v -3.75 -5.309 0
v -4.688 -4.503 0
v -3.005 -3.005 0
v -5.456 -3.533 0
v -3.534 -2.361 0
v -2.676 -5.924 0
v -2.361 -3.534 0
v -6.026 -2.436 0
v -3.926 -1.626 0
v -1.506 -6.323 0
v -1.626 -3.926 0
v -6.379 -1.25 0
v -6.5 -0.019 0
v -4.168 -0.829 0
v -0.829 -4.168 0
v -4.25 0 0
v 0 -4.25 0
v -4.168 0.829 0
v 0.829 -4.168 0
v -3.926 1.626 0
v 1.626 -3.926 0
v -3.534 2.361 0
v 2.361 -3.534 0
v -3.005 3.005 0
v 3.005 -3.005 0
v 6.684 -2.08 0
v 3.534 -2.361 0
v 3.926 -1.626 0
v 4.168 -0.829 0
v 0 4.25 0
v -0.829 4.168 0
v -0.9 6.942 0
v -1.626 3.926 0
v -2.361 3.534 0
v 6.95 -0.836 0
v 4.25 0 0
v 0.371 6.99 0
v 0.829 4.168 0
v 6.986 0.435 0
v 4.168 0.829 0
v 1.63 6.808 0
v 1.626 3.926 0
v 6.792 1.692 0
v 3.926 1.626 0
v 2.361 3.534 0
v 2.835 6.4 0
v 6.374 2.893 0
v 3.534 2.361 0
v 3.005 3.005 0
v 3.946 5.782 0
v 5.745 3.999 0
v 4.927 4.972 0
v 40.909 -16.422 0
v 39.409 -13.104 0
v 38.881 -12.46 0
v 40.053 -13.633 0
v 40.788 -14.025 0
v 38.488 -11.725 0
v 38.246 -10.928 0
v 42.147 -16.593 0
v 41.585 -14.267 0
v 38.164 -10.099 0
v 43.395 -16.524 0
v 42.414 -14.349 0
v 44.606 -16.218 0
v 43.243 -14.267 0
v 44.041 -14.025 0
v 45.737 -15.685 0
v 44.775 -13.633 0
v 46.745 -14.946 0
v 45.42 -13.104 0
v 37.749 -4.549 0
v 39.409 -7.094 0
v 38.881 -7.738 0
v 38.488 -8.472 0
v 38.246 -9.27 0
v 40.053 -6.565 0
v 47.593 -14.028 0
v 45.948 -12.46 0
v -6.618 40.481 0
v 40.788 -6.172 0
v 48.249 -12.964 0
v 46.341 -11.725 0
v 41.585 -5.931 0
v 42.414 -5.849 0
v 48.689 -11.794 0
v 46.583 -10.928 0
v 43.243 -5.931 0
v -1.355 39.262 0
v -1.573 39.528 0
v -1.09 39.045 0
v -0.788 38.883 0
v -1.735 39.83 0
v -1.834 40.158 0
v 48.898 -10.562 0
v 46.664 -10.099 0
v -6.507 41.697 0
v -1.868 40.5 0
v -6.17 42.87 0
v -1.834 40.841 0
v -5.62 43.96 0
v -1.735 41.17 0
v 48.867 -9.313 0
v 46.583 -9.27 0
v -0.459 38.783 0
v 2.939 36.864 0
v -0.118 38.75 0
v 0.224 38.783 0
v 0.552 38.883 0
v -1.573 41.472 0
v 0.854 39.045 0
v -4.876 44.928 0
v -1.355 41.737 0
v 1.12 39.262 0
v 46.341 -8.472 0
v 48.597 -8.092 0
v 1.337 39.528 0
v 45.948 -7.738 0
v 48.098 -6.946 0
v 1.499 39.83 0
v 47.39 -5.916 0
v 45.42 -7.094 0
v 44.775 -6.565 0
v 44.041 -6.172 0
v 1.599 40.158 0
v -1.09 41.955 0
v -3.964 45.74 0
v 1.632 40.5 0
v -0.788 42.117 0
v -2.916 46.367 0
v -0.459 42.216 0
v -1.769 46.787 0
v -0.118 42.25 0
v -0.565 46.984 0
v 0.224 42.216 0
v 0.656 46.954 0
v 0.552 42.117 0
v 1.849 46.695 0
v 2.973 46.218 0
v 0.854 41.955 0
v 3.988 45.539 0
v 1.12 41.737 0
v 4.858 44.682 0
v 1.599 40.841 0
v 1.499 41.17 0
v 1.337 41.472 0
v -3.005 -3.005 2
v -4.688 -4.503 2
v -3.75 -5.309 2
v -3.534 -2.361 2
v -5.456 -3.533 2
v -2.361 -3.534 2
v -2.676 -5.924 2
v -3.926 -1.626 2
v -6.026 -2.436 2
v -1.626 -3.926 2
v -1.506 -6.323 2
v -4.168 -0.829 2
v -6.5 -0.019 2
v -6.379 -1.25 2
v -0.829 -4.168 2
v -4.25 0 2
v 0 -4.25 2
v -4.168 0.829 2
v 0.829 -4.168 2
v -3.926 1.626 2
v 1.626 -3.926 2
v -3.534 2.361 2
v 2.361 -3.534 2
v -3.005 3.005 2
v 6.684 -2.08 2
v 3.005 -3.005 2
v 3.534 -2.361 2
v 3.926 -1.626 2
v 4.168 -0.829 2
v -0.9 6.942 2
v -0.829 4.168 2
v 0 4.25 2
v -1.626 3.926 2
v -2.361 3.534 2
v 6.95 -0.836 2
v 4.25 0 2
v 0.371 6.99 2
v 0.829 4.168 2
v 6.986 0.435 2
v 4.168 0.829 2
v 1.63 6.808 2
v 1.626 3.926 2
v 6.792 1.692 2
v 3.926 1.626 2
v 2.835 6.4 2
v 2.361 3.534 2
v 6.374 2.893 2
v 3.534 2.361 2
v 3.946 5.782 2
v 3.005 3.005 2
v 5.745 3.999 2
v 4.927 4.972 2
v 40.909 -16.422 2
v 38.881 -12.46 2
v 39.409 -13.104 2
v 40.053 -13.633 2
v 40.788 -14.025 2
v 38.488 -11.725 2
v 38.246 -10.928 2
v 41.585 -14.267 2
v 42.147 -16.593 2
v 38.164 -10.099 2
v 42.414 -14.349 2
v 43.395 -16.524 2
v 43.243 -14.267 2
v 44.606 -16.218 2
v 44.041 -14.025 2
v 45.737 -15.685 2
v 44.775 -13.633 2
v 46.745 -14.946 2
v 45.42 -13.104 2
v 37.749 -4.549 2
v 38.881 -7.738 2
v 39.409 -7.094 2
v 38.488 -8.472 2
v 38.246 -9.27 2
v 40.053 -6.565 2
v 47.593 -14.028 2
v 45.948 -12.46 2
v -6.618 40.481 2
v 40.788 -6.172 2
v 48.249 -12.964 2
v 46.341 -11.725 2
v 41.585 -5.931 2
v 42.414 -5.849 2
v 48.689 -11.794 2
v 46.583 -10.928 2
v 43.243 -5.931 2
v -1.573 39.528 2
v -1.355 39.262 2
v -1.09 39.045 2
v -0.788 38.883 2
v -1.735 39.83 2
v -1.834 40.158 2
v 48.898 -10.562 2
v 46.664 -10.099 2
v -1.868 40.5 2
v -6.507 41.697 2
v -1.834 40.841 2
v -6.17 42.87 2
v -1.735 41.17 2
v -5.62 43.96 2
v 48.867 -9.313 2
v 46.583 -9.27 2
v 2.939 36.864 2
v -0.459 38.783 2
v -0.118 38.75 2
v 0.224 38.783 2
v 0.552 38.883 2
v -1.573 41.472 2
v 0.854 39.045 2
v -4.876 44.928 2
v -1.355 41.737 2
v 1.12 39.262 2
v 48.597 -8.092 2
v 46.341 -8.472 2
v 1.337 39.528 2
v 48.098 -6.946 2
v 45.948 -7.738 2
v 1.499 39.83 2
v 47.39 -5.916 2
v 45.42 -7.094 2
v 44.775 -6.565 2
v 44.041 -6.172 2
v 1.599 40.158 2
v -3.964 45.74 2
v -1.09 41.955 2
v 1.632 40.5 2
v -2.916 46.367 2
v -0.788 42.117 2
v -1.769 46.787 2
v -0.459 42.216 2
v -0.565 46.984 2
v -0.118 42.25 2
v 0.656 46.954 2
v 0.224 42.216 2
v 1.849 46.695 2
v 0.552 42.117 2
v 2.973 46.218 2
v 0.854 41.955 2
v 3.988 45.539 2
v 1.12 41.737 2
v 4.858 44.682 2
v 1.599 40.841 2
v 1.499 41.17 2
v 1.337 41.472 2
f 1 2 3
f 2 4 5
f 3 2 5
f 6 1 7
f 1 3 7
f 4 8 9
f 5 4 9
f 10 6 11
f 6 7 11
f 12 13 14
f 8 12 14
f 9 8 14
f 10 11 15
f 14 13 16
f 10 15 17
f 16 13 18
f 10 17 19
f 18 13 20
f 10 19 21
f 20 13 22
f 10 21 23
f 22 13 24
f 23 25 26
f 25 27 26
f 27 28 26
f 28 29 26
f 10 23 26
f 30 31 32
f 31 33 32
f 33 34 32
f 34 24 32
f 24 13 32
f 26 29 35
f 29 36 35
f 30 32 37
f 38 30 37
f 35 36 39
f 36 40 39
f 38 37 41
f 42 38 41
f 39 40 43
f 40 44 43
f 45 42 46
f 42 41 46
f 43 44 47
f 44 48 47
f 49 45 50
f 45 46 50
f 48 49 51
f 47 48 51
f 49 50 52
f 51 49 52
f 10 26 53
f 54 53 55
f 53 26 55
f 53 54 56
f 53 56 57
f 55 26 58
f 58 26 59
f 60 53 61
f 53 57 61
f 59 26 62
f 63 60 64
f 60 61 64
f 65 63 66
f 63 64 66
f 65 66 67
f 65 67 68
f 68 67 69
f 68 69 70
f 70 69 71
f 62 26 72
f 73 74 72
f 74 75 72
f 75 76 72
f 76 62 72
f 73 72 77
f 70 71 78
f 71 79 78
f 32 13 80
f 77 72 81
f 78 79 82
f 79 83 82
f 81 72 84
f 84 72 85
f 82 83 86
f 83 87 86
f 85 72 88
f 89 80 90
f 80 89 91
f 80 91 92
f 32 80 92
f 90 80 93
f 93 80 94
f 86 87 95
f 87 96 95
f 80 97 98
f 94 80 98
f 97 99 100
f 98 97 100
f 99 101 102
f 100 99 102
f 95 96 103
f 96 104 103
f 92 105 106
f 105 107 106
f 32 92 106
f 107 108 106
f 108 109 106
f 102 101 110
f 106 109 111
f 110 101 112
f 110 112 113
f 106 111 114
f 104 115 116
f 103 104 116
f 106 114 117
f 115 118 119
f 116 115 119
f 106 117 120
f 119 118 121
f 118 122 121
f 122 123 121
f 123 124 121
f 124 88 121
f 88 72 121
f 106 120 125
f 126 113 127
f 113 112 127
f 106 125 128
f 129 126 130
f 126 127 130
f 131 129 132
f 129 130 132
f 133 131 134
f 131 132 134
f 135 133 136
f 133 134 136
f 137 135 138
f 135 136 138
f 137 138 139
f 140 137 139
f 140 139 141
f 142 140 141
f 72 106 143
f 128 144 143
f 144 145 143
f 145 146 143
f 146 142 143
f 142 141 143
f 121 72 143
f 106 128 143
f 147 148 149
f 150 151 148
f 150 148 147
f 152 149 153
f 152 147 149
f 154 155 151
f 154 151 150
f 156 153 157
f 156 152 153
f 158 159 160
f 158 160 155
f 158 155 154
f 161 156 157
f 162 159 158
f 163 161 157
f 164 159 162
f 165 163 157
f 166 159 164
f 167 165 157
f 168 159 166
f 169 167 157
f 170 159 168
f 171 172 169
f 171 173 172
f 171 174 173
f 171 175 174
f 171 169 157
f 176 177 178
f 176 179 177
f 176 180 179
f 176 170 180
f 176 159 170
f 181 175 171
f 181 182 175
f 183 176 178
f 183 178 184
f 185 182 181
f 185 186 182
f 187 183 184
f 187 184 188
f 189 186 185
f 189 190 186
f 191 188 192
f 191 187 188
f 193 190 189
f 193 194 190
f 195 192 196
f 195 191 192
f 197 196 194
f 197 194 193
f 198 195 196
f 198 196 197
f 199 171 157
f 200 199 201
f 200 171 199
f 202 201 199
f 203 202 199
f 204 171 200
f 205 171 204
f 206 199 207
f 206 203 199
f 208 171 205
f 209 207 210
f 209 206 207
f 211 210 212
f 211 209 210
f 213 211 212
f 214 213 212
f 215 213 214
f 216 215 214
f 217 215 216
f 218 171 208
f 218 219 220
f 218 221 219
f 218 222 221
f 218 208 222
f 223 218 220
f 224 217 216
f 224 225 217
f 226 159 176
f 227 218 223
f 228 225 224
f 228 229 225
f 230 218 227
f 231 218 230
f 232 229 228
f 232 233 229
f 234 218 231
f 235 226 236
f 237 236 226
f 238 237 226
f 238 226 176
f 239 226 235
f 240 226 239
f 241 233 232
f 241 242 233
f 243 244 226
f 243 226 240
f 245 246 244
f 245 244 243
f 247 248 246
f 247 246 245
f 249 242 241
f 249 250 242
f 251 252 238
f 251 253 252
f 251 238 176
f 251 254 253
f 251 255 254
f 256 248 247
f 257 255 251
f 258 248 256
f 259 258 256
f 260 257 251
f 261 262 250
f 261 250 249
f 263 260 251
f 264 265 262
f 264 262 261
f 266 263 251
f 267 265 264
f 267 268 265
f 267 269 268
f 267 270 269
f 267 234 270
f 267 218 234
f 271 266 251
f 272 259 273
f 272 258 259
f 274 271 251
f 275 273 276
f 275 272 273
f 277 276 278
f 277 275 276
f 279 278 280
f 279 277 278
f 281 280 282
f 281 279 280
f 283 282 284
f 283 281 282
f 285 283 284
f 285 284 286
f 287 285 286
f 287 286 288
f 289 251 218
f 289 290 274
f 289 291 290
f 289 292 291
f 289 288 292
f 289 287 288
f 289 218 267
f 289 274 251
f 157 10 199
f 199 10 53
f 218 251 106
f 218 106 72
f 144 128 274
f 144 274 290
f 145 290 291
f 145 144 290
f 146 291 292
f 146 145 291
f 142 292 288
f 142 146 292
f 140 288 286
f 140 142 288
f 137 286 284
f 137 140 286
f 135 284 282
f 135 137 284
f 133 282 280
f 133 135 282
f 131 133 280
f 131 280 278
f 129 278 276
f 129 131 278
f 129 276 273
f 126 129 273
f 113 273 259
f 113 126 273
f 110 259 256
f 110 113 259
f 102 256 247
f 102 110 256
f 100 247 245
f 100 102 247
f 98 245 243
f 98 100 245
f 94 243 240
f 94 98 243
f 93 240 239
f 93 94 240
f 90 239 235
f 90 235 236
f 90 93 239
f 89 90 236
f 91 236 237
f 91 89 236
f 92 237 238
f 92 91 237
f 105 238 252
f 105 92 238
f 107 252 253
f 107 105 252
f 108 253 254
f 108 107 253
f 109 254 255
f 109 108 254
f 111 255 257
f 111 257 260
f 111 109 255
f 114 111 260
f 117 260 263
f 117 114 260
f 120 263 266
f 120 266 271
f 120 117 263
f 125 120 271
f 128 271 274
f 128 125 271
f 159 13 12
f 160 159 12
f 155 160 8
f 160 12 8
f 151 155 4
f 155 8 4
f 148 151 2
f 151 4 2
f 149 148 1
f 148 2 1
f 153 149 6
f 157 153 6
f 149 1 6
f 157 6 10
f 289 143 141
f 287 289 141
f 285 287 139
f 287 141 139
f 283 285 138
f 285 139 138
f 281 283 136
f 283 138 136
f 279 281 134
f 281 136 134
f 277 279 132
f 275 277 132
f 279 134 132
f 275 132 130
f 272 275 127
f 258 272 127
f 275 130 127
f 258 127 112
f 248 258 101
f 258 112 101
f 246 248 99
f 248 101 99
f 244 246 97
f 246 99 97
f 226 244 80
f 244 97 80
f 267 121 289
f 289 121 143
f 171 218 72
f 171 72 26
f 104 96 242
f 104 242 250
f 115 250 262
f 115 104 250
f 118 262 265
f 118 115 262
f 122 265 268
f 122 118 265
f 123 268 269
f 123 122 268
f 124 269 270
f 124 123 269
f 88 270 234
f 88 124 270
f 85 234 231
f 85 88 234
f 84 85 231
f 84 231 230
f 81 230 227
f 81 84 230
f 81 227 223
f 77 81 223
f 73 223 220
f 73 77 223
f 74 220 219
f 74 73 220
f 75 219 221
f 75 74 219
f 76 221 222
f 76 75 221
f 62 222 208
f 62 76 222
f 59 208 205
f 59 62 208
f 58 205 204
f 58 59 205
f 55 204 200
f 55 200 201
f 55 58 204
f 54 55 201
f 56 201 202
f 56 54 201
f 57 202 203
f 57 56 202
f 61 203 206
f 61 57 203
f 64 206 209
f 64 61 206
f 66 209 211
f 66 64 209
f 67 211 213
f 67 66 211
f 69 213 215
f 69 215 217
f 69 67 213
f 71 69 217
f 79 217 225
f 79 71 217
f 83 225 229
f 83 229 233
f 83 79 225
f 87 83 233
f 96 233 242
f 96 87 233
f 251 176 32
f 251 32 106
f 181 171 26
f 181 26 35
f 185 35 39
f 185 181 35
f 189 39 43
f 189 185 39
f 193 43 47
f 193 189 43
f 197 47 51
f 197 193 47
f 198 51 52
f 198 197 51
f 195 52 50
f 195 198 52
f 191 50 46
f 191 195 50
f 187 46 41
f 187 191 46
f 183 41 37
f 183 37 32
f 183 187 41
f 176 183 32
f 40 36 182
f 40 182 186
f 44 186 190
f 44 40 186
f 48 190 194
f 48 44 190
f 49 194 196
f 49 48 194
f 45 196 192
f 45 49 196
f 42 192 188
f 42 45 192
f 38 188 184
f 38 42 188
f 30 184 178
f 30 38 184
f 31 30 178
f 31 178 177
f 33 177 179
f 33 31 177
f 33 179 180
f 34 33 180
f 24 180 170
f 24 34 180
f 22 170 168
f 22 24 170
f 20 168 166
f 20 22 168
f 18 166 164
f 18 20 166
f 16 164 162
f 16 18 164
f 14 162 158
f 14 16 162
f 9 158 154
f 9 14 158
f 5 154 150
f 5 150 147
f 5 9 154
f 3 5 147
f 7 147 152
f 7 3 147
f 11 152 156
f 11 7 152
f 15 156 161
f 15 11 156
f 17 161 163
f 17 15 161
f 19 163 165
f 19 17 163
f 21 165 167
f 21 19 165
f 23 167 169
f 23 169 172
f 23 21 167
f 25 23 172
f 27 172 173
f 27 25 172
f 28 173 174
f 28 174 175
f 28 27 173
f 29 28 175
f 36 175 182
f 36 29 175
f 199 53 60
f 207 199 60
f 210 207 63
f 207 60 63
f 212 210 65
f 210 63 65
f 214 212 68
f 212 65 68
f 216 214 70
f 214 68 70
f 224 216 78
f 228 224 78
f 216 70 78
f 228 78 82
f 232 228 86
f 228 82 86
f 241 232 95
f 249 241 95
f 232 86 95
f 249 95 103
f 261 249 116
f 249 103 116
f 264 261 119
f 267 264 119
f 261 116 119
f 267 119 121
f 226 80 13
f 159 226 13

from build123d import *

# Parameters (mm, degrees)
SKETCH_1_R          = 6.5
SKETCH_1_R_2        = 1.75
SKETCH_1_R_3        = 4.25
EXTRUDE_1_DEPTH     = 2
SKETCH_2_R          = 4.25
CUT_EXTRUDE_1_DEPTH = 3


with BuildPart() as part:
    # 草图1 → 凸台-拉伸1 (new body)
    with BuildSketch(Plane.XY):
        with BuildLine():
            Line((-6.617803136, 40.4809175), (-6.49997249, -0.018911091))
            ThreePointArc((-6.49997249, -0.018911091), (-0.009455556, 6.499993122), (6.5, 0))
            ThreePointArc((6.5, 0), (4.028885042, -5.100792617), (-1.505564714, -6.323232946))
            Line((-1.505564714, -6.323232946), (40.908736278, -16.422097799))
            ThreePointArc((40.908736278, -16.422097799), (36.882334136, -6.68604451), (47.389966762, -5.916431333))
            Line((47.389966762, -5.916431333), (4.857835124, 44.682262111))
            ThreePointArc((4.857835124, 44.682262111), (5.989207405, 42.725606264), (6.382169354, 40.499828591))
            ThreePointArc((6.382169354, 40.499828591), (-0.10837509, 33.999835469), (-6.617803136, 40.4809175))
        make_face()
        with Locations((-0.117830646, 40.499828591)):
            Circle(SKETCH_1_R)
        with Locations((-0.117830646, 40.499828591)):
            Circle(SKETCH_1_R_2, mode=Mode.SUBTRACT)
        with BuildLine():
            ThreePointArc((6.5, 0), (-0.009455556, 6.499993122), (-6.49997249, -0.018911091))
            ThreePointArc((-6.49997249, -0.018911091), (-5.094926397, -4.036300906), (-1.505564714, -6.323232946))
            ThreePointArc((-1.505564714, -6.323232946), (4.028885042, -5.100792617), (6.5, 0))
        make_face()
        Circle(SKETCH_1_R_3, mode=Mode.SUBTRACT)
        with Locations((42.414300993, -10.098864853)):
            Circle(SKETCH_1_R)
        with Locations((42.414300993, -10.098864853)):
            Circle(SKETCH_1_R_3, mode=Mode.SUBTRACT)
    extrude(amount=EXTRUDE_1_DEPTH)

    # 草图2 → 切除-拉伸1 (cut, through all)
    with BuildSketch(Plane.XY.offset(2)):
        with Locations((42.414300993, -10.098864853)):
            Circle(SKETCH_2_R)
        with BuildLine():
            Line((2.93856308, 36.863765144), (37.74927899, -4.549083802))
            Line((37.74927899, -4.549083802), (6.683866701, -2.079886036))
            ThreePointArc((6.683866701, -2.079886036), (5.358409291, 4.504159175), (-0.899681346, 6.941943062))
            Line((-0.899681346, 6.941943062), (2.93856308, 36.863765144))
        make_face()
    extrude(amount=-CUT_EXTRUDE_1_DEPTH, mode=Mode.SUBTRACT)


solid = part.part
